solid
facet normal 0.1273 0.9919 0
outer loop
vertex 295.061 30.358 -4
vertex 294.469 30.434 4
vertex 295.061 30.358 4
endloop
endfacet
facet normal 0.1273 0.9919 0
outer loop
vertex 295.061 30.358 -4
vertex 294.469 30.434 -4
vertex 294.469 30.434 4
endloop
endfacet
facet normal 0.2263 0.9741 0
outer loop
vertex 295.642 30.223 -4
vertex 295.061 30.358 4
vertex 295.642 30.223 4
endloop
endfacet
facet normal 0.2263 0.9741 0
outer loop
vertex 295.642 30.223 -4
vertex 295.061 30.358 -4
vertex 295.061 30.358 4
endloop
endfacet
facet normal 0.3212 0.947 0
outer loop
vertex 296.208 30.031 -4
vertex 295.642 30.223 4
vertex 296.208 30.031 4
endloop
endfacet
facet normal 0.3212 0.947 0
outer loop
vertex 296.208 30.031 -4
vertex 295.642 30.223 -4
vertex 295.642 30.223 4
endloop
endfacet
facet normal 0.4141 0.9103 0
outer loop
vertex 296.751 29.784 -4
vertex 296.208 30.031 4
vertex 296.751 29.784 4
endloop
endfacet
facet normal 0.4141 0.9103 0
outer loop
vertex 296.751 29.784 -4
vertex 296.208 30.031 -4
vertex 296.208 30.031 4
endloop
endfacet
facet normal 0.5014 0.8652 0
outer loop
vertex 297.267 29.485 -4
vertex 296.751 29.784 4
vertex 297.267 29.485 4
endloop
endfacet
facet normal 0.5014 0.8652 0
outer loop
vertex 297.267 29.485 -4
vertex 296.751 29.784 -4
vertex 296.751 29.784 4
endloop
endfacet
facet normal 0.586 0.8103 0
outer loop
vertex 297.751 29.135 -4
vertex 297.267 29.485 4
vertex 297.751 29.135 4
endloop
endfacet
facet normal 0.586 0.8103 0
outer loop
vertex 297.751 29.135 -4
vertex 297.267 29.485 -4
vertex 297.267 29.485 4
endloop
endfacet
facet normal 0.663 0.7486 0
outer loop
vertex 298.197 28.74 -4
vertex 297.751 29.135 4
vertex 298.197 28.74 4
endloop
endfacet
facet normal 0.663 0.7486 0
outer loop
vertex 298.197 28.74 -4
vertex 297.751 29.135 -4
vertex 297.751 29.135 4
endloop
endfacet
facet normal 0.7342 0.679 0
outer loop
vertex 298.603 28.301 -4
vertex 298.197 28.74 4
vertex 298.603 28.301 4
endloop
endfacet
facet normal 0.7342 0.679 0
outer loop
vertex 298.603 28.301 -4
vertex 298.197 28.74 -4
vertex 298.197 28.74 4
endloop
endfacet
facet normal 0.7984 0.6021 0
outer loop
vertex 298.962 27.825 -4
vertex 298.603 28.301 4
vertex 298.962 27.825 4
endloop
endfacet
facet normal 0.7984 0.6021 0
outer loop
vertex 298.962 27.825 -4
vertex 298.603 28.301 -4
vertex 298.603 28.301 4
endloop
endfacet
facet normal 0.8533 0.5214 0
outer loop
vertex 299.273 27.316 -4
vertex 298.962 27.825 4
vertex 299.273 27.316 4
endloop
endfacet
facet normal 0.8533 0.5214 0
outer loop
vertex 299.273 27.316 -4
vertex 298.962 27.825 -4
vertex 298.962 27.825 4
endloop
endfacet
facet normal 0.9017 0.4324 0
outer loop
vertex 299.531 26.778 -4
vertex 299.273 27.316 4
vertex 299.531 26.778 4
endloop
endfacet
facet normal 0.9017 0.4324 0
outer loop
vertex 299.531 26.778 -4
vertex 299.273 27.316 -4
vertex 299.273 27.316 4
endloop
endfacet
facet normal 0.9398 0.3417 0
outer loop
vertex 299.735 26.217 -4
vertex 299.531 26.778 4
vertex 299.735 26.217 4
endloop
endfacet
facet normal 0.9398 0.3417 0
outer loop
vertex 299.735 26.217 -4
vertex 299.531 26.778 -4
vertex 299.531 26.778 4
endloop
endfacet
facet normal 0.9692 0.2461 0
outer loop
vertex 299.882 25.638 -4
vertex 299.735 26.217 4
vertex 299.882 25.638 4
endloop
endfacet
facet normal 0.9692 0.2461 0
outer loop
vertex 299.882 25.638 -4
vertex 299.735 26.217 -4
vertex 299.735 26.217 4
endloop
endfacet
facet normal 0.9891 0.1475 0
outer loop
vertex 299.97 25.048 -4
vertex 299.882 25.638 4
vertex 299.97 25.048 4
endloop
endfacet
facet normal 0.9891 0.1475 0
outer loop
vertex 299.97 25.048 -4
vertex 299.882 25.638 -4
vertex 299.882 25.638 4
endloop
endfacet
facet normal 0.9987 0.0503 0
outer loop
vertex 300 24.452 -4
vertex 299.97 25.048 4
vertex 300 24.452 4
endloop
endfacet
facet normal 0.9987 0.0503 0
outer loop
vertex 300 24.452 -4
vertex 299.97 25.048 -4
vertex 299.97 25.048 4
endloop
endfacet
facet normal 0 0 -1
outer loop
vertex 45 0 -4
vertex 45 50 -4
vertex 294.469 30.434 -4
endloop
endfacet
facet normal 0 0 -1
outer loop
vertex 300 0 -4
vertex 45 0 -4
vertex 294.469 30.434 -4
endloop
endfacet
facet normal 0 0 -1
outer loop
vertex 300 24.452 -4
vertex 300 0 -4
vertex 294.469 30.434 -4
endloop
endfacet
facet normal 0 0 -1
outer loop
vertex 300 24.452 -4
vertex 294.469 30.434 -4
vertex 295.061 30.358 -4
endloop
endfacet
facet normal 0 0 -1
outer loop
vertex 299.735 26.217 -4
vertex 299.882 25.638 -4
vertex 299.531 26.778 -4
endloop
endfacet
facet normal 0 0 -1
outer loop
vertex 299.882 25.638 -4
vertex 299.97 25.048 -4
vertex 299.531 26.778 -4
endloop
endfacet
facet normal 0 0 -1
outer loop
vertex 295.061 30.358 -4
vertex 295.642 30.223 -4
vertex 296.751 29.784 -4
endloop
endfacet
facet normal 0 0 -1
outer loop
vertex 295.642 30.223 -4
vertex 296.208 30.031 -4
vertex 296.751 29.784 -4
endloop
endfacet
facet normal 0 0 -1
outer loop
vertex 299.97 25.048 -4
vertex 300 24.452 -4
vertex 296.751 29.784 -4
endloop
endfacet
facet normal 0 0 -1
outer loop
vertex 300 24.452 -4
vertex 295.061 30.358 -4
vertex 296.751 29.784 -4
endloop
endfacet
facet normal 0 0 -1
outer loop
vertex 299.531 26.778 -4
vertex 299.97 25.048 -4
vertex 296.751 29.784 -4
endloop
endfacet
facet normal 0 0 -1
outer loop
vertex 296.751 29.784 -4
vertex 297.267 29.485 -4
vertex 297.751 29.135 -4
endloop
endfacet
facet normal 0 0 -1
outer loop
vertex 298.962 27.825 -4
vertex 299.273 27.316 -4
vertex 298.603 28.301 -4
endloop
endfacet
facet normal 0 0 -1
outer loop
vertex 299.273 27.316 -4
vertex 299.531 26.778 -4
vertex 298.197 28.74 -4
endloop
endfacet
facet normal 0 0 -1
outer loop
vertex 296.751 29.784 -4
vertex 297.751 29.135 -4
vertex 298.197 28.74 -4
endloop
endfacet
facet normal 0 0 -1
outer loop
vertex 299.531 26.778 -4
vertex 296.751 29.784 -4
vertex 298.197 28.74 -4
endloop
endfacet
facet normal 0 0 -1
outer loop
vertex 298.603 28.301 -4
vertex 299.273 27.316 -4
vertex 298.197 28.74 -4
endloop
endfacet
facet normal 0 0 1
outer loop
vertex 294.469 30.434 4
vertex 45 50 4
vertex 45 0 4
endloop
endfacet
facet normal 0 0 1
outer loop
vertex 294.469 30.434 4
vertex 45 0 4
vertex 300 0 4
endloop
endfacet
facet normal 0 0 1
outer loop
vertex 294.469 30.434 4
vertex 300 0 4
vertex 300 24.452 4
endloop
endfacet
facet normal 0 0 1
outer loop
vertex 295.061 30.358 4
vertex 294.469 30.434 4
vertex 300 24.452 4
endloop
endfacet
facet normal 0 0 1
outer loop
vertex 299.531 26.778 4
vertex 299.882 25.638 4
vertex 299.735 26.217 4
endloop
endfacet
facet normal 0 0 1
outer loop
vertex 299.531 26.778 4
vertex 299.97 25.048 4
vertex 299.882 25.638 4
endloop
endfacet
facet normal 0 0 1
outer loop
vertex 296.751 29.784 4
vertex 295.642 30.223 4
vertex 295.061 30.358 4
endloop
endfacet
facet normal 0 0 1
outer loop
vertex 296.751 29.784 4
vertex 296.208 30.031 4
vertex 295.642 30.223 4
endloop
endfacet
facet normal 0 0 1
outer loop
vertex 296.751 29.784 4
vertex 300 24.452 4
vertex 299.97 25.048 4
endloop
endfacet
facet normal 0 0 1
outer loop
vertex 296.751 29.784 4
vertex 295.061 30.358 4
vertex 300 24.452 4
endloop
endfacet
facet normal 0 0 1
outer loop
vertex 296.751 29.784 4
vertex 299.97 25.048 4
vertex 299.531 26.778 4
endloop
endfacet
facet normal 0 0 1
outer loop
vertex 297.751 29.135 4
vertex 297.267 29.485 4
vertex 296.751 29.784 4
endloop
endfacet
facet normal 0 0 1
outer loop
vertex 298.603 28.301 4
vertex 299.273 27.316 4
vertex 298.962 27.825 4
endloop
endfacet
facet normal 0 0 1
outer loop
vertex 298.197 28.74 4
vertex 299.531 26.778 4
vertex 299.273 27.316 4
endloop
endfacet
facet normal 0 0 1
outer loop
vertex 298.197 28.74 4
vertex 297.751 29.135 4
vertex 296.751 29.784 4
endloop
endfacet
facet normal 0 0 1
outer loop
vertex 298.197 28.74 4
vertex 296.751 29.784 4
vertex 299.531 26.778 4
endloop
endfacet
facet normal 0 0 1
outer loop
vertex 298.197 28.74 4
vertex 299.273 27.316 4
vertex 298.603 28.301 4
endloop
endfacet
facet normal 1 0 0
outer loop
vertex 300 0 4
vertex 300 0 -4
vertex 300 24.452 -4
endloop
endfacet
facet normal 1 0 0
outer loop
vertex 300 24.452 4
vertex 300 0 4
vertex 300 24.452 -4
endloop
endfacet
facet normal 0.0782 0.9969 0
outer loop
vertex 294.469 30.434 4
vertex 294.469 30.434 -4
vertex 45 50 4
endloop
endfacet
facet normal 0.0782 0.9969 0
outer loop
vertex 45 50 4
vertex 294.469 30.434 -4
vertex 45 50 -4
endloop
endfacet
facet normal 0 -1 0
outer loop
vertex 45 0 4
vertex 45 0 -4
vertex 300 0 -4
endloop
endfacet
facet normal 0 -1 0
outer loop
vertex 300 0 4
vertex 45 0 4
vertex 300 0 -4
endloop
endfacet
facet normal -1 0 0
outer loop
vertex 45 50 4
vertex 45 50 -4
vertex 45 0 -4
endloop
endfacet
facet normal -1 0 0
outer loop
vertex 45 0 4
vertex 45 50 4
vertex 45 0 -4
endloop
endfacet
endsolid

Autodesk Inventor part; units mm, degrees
ref_plane "YZ Plane" through (0, 0, 0) normal (1, 0, 0) x (0, 1, 0)
ref_plane "XZ Plane" through (0, 0, 0) normal (0, 1, 0) x (-1, 0, 0)
ref_plane "XY Plane" through (0, 0, 0) normal (0, 0, 1) x (1, 0, 0)
sketch "Sketch3" plane through (0, 0, 0) normal (0, 0, 1) x (1, 0, 0)
  line L0 (0, 0) -> (300, 0)
  line L1 (300, 0) -> (300, 30)
  line L2 (300, 30) -> (-5.542, 53.9641)
  line L3 (45, 50) -> (45, 0)
  dimension "d11" = 300
  dimension "d12" = 30
  dimension "d13" = 45
  dimension "d14" = 50
extrude "Plate1" add sketch "Sketch3" along normal mid plane 8
fillet "Corner Round1" radius 6 1 edges at (300, 30, 0)
equation "\"d15\" = Thickness"
equation "\"BendRadius\" = Thickness"
equation "\"BendReliefWidth\" = Thickness"
equation "\"BendReliefDepth\" = 0.5 * Thickness"
equation "\"CornerReliefSize\" = 4 * Thickness"
equation "\"MinimumRemnant\" = 2 * Thickness"
equation "\"TransitionRadius\" = BendRadius"
equation "\"JacobiRadiusSize\" = BendRadius"
equation "\"GapSize\" = Thickness"
equation "\"Thickness\" = 8"
properties part number "PNS-725 charging hatch reinf D1200" material "Steel"
